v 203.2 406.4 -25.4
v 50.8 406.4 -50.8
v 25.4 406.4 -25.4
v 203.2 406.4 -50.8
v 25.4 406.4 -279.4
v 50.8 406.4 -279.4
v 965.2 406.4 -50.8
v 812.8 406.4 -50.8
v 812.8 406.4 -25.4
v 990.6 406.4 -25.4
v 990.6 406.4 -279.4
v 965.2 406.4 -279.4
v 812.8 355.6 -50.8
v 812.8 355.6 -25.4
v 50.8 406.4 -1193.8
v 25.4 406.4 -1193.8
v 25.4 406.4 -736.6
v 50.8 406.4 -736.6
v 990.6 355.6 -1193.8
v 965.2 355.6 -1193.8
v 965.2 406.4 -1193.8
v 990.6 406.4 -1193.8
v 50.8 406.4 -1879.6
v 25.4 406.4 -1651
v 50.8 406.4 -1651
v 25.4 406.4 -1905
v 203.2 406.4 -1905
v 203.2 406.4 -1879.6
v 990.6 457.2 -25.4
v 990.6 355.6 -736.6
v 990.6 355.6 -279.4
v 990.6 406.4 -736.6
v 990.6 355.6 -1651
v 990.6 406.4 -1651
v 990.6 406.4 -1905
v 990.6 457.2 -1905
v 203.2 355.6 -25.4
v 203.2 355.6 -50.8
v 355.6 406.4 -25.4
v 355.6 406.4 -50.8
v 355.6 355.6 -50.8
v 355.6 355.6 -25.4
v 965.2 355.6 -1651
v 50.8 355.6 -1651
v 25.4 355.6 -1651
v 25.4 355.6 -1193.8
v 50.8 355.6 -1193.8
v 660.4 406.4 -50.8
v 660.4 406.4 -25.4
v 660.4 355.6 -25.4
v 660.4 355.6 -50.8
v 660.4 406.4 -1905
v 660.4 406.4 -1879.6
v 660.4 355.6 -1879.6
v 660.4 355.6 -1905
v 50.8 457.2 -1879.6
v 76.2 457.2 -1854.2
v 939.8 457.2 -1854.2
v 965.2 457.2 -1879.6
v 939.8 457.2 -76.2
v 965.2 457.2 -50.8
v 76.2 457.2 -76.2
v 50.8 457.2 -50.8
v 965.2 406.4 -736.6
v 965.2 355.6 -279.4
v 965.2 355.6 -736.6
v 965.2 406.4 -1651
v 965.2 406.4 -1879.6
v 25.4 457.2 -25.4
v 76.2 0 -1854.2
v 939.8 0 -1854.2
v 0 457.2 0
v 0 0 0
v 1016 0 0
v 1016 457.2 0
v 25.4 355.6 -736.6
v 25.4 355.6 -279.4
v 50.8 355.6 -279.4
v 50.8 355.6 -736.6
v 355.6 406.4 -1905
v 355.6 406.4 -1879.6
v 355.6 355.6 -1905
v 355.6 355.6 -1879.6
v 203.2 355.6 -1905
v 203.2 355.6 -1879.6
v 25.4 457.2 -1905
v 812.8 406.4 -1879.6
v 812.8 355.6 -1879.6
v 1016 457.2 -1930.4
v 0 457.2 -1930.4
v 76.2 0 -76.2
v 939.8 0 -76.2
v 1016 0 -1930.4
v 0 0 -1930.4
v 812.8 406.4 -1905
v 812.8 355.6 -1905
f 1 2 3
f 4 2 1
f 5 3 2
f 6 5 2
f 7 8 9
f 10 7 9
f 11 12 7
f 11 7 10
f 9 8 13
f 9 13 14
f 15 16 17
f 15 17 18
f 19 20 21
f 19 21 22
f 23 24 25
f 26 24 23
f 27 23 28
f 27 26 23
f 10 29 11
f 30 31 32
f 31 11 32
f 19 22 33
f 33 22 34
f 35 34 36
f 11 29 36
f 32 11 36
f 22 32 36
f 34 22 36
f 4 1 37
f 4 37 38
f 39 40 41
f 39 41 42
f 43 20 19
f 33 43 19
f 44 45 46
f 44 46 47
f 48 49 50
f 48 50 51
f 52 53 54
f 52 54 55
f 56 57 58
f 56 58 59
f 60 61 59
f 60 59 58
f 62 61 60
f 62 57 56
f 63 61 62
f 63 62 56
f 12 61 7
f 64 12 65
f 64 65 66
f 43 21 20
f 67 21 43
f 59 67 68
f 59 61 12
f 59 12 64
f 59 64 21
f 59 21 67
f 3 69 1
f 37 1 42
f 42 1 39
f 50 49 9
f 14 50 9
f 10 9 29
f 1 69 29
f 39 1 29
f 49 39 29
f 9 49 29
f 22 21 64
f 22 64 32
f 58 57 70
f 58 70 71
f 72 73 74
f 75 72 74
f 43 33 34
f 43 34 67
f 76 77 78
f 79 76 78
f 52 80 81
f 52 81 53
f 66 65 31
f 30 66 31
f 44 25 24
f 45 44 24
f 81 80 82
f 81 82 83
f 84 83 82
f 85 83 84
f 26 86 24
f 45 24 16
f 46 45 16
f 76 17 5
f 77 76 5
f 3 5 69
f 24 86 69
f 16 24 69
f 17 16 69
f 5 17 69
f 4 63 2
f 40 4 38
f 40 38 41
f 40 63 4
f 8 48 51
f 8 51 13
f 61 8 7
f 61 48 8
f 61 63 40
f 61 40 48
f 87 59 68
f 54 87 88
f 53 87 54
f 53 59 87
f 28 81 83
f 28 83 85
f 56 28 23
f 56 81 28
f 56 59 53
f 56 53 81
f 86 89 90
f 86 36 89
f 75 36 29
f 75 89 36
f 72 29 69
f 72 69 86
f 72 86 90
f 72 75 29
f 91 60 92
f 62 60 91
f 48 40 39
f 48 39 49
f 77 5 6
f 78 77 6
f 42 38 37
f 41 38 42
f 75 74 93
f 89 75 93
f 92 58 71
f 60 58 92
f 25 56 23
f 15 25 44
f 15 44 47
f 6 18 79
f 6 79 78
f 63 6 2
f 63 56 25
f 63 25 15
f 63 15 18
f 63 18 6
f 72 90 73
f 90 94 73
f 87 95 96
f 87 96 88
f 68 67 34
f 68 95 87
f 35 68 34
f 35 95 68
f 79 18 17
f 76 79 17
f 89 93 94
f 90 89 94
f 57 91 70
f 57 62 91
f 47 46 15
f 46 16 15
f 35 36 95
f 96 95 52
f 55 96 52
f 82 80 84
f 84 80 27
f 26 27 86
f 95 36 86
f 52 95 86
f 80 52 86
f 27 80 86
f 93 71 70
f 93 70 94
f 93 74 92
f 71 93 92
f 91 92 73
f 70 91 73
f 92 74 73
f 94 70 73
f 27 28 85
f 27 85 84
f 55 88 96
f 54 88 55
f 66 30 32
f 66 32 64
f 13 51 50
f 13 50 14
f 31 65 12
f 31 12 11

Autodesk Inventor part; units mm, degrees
ref_plane "YZ Plane" through (0, 0, 0) normal (1, 0, 0) x (0, 1, 0)
sketch "Sketch1" plane through (0, 0, 0) normal (0, 1, 0) x (-1, 0, 0)
  line L0 (0, 0) -> (-1016, 0)
  line L1 (-1016, 0) -> (-1016, -1930.4)
  line L2 (-1016, -1930.4) -> (0, -1930.4)
  line L3 (0, -1930.4) -> (0, 0)
  dimension "d0" = 1016
  dimension "d1" = 1930.4
extrude "Extrusion1" add sketch "Sketch1" along normal blind 457.2
sketch "Sketch8" plane through (0, 457.2, 0) normal (0, 1, 0) x (1, 0, 0)
  line L0 (25.4, 25.4) -> (990.6, 25.4)
  line L1 (990.6, 25.4) -> (990.6, 1905)
  line L2 (990.6, 1905) -> (25.4, 1905)
  line L3 (25.4, 1905) -> (25.4, 25.4)
  line L4 (50.8, 50.8) -> (965.2, 50.8)
  line L5 (965.2, 50.8) -> (965.2, 1879.6)
  line L6 (965.2, 1879.6) -> (50.8, 1879.6)
  line L7 (50.8, 1879.6) -> (50.8, 50.8)
  line L8 (50.8, 965.2) -> (25.4, 965.2)
  line L9 (965.2, 965.2) -> (990.6, 965.2)
  line L10 (508, 1879.6) -> (508, 1905)
  line L11 (508, 50.8) -> (508, 25.4)
  line L12 (508, 25.4) -> (508, 0)
  line L13 (0, 0) -> (1016, 0) projected
  line L14 (508, 1905) -> (508, 1930.4)
  line L15 (1016, 1930.4) -> (0, 1930.4) projected
  line L16 (25.4, 965.2) -> (0, 965.2)
  line L17 (0, 1930.4) -> (0, 0) projected
  line L18 (990.6, 965.2) -> (1016, 965.2)
  line L19 (1016, 0) -> (1016, 1930.4) projected
  dimension "d13" = 25.4
  dimension "d14" = 25.4
  dimension "d15" = 25.4
  dimension "d16" = 25.4
extrude "Extrusion3" cut sketch "Sketch8" against normal blind 50.8 contours L3 L8 L7 L4 L11 L0 | L11 L4 L5 L9 L1 L0 | L3 L2 L10 L6 L7 L8 | L9 L5 L6 L10 L2 L1
sketch "InnerInset1" plane through (0, 406.4, 0) normal (0, 1, 0) x (1, 0, 0)
  line L0 (25.4, 25.4) -> (25.4, 1905) projected
  line L1 (50.8, 1879.6) -> (50.8, 50.8) projected
  line L2 (25.4, 279.4) -> (50.8, 279.4)
  line L3 (50.8, 279.4) -> (50.8, 736.6)
  line L4 (50.8, 736.6) -> (25.4, 736.6)
  line L5 (25.4, 736.6) -> (25.4, 279.4)
  line L6 (990.6, 25.4) -> (25.4, 25.4) projected
  line L7 (25.4, 1193.8) -> (50.8, 1193.8)
  line L8 (50.8, 1193.8) -> (50.8, 1651)
  line L9 (50.8, 1651) -> (25.4, 1651)
  line L10 (25.4, 1651) -> (25.4, 1193.8)
  line L11 (25.4, 1905) -> (990.6, 1905) projected
  point P0 (0, 0)
  dimension "d19" = 254
  dimension "d20" = 457.2
  dimension "d21" = 457.2
  dimension "d22" = 254
extrude "Extrusion4" cut sketch "InnerInset1" against normal blind 50.8 contours L0 L4 L1 L2 | L0 L9 L1 L7
ref_plane "Work Plane1" through (508, 0, 0) normal (1, 0, 0) x (0, 0, -1)
mirror "Mirror1" about plane through (508, 0, 0) normal (1, 0, 0) of "Extrusion4"
ref_plane "Work Plane2" through (1016, 0, -965.2) normal (0, 0, -1) x (-1, 0, 0)
sketch "Sketch10" plane through (0, 406.4, 0) normal (0, 1, 0) x (1, 0, 0)
  line L0 (50.8, 50.8) -> (965.2, 50.8) projected
  line L1 (990.6, 25.4) -> (25.4, 25.4) projected
  line L2 (203.2, 50.8) -> (355.6, 50.8)
  line L3 (355.6, 50.8) -> (355.6, 25.4)
  line L4 (355.6, 25.4) -> (203.2, 25.4)
  line L5 (203.2, 25.4) -> (203.2, 50.8)
  line L6 (660.4, 50.8) -> (812.8, 50.8)
  line L7 (812.8, 50.8) -> (812.8, 25.4)
  line L8 (812.8, 25.4) -> (660.4, 25.4)
  line L9 (660.4, 25.4) -> (660.4, 50.8)
  line L10 (203.2, 38.1) -> (355.6, 38.1)
  line L11 (660.4, 38.1) -> (812.8, 38.1)
  line L12 (25.4, 25.4) -> (25.4, 1905) projected
  line L13 (990.6, 1905) -> (990.6, 25.4) projected
  point P0 (0, 0)
  dimension "d25" = 177.8
  dimension "d26" = 177.8
  dimension "d27" = 152.4
extrude "Extrusion5" cut sketch "Sketch10" against normal blind 50.8 contours L0 L3 L10 L5 | L10 L3 L1 L5 | L0 L7 L11 L9 | L11 L7 L1 L9
mirror "Mirror2" about plane through (1016, 0, -965.2) normal (0, 0, -1) of "Extrusion5"
sketch "Sketch11" plane through (0, 457.2, 0) normal (0, 1, 0) x (1, 0, 0)
  point P0 (0, 0)
sketch "Sketch12" plane through (0, 457.2, 0) normal (0, 1, 0) x (1, 0, 0)
  line L0 (76.2, 1854.2) -> (939.8, 1854.2)
  line L1 (939.8, 1854.2) -> (939.8, 76.2)
  line L2 (939.8, 76.2) -> (76.2, 76.2)
  line L3 (76.2, 76.2) -> (76.2, 1854.2)
  line L4 (76.2, 965.2) -> (50.8, 965.2)
  line L5 (50.8, 1193.8) -> (50.8, 736.6) projected
  line L6 (939.8, 965.2) -> (965.2, 965.2)
  line L7 (965.2, 736.6) -> (965.2, 1193.8) projected
  line L8 (508, 1854.2) -> (508, 1879.6)
  line L9 (965.2, 1879.6) -> (50.8, 1879.6) projected
  line L10 (508, 76.2) -> (508, 50.8)
  line L11 (50.8, 50.8) -> (965.2, 50.8) projected
  point P0 (0, 0)
  dimension "d30" = 25.4
  dimension "d31" = 25.4
extrude "Extrusion6" cut sketch "Sketch12" against normal blind 609.6
properties part number "rev1 base"
